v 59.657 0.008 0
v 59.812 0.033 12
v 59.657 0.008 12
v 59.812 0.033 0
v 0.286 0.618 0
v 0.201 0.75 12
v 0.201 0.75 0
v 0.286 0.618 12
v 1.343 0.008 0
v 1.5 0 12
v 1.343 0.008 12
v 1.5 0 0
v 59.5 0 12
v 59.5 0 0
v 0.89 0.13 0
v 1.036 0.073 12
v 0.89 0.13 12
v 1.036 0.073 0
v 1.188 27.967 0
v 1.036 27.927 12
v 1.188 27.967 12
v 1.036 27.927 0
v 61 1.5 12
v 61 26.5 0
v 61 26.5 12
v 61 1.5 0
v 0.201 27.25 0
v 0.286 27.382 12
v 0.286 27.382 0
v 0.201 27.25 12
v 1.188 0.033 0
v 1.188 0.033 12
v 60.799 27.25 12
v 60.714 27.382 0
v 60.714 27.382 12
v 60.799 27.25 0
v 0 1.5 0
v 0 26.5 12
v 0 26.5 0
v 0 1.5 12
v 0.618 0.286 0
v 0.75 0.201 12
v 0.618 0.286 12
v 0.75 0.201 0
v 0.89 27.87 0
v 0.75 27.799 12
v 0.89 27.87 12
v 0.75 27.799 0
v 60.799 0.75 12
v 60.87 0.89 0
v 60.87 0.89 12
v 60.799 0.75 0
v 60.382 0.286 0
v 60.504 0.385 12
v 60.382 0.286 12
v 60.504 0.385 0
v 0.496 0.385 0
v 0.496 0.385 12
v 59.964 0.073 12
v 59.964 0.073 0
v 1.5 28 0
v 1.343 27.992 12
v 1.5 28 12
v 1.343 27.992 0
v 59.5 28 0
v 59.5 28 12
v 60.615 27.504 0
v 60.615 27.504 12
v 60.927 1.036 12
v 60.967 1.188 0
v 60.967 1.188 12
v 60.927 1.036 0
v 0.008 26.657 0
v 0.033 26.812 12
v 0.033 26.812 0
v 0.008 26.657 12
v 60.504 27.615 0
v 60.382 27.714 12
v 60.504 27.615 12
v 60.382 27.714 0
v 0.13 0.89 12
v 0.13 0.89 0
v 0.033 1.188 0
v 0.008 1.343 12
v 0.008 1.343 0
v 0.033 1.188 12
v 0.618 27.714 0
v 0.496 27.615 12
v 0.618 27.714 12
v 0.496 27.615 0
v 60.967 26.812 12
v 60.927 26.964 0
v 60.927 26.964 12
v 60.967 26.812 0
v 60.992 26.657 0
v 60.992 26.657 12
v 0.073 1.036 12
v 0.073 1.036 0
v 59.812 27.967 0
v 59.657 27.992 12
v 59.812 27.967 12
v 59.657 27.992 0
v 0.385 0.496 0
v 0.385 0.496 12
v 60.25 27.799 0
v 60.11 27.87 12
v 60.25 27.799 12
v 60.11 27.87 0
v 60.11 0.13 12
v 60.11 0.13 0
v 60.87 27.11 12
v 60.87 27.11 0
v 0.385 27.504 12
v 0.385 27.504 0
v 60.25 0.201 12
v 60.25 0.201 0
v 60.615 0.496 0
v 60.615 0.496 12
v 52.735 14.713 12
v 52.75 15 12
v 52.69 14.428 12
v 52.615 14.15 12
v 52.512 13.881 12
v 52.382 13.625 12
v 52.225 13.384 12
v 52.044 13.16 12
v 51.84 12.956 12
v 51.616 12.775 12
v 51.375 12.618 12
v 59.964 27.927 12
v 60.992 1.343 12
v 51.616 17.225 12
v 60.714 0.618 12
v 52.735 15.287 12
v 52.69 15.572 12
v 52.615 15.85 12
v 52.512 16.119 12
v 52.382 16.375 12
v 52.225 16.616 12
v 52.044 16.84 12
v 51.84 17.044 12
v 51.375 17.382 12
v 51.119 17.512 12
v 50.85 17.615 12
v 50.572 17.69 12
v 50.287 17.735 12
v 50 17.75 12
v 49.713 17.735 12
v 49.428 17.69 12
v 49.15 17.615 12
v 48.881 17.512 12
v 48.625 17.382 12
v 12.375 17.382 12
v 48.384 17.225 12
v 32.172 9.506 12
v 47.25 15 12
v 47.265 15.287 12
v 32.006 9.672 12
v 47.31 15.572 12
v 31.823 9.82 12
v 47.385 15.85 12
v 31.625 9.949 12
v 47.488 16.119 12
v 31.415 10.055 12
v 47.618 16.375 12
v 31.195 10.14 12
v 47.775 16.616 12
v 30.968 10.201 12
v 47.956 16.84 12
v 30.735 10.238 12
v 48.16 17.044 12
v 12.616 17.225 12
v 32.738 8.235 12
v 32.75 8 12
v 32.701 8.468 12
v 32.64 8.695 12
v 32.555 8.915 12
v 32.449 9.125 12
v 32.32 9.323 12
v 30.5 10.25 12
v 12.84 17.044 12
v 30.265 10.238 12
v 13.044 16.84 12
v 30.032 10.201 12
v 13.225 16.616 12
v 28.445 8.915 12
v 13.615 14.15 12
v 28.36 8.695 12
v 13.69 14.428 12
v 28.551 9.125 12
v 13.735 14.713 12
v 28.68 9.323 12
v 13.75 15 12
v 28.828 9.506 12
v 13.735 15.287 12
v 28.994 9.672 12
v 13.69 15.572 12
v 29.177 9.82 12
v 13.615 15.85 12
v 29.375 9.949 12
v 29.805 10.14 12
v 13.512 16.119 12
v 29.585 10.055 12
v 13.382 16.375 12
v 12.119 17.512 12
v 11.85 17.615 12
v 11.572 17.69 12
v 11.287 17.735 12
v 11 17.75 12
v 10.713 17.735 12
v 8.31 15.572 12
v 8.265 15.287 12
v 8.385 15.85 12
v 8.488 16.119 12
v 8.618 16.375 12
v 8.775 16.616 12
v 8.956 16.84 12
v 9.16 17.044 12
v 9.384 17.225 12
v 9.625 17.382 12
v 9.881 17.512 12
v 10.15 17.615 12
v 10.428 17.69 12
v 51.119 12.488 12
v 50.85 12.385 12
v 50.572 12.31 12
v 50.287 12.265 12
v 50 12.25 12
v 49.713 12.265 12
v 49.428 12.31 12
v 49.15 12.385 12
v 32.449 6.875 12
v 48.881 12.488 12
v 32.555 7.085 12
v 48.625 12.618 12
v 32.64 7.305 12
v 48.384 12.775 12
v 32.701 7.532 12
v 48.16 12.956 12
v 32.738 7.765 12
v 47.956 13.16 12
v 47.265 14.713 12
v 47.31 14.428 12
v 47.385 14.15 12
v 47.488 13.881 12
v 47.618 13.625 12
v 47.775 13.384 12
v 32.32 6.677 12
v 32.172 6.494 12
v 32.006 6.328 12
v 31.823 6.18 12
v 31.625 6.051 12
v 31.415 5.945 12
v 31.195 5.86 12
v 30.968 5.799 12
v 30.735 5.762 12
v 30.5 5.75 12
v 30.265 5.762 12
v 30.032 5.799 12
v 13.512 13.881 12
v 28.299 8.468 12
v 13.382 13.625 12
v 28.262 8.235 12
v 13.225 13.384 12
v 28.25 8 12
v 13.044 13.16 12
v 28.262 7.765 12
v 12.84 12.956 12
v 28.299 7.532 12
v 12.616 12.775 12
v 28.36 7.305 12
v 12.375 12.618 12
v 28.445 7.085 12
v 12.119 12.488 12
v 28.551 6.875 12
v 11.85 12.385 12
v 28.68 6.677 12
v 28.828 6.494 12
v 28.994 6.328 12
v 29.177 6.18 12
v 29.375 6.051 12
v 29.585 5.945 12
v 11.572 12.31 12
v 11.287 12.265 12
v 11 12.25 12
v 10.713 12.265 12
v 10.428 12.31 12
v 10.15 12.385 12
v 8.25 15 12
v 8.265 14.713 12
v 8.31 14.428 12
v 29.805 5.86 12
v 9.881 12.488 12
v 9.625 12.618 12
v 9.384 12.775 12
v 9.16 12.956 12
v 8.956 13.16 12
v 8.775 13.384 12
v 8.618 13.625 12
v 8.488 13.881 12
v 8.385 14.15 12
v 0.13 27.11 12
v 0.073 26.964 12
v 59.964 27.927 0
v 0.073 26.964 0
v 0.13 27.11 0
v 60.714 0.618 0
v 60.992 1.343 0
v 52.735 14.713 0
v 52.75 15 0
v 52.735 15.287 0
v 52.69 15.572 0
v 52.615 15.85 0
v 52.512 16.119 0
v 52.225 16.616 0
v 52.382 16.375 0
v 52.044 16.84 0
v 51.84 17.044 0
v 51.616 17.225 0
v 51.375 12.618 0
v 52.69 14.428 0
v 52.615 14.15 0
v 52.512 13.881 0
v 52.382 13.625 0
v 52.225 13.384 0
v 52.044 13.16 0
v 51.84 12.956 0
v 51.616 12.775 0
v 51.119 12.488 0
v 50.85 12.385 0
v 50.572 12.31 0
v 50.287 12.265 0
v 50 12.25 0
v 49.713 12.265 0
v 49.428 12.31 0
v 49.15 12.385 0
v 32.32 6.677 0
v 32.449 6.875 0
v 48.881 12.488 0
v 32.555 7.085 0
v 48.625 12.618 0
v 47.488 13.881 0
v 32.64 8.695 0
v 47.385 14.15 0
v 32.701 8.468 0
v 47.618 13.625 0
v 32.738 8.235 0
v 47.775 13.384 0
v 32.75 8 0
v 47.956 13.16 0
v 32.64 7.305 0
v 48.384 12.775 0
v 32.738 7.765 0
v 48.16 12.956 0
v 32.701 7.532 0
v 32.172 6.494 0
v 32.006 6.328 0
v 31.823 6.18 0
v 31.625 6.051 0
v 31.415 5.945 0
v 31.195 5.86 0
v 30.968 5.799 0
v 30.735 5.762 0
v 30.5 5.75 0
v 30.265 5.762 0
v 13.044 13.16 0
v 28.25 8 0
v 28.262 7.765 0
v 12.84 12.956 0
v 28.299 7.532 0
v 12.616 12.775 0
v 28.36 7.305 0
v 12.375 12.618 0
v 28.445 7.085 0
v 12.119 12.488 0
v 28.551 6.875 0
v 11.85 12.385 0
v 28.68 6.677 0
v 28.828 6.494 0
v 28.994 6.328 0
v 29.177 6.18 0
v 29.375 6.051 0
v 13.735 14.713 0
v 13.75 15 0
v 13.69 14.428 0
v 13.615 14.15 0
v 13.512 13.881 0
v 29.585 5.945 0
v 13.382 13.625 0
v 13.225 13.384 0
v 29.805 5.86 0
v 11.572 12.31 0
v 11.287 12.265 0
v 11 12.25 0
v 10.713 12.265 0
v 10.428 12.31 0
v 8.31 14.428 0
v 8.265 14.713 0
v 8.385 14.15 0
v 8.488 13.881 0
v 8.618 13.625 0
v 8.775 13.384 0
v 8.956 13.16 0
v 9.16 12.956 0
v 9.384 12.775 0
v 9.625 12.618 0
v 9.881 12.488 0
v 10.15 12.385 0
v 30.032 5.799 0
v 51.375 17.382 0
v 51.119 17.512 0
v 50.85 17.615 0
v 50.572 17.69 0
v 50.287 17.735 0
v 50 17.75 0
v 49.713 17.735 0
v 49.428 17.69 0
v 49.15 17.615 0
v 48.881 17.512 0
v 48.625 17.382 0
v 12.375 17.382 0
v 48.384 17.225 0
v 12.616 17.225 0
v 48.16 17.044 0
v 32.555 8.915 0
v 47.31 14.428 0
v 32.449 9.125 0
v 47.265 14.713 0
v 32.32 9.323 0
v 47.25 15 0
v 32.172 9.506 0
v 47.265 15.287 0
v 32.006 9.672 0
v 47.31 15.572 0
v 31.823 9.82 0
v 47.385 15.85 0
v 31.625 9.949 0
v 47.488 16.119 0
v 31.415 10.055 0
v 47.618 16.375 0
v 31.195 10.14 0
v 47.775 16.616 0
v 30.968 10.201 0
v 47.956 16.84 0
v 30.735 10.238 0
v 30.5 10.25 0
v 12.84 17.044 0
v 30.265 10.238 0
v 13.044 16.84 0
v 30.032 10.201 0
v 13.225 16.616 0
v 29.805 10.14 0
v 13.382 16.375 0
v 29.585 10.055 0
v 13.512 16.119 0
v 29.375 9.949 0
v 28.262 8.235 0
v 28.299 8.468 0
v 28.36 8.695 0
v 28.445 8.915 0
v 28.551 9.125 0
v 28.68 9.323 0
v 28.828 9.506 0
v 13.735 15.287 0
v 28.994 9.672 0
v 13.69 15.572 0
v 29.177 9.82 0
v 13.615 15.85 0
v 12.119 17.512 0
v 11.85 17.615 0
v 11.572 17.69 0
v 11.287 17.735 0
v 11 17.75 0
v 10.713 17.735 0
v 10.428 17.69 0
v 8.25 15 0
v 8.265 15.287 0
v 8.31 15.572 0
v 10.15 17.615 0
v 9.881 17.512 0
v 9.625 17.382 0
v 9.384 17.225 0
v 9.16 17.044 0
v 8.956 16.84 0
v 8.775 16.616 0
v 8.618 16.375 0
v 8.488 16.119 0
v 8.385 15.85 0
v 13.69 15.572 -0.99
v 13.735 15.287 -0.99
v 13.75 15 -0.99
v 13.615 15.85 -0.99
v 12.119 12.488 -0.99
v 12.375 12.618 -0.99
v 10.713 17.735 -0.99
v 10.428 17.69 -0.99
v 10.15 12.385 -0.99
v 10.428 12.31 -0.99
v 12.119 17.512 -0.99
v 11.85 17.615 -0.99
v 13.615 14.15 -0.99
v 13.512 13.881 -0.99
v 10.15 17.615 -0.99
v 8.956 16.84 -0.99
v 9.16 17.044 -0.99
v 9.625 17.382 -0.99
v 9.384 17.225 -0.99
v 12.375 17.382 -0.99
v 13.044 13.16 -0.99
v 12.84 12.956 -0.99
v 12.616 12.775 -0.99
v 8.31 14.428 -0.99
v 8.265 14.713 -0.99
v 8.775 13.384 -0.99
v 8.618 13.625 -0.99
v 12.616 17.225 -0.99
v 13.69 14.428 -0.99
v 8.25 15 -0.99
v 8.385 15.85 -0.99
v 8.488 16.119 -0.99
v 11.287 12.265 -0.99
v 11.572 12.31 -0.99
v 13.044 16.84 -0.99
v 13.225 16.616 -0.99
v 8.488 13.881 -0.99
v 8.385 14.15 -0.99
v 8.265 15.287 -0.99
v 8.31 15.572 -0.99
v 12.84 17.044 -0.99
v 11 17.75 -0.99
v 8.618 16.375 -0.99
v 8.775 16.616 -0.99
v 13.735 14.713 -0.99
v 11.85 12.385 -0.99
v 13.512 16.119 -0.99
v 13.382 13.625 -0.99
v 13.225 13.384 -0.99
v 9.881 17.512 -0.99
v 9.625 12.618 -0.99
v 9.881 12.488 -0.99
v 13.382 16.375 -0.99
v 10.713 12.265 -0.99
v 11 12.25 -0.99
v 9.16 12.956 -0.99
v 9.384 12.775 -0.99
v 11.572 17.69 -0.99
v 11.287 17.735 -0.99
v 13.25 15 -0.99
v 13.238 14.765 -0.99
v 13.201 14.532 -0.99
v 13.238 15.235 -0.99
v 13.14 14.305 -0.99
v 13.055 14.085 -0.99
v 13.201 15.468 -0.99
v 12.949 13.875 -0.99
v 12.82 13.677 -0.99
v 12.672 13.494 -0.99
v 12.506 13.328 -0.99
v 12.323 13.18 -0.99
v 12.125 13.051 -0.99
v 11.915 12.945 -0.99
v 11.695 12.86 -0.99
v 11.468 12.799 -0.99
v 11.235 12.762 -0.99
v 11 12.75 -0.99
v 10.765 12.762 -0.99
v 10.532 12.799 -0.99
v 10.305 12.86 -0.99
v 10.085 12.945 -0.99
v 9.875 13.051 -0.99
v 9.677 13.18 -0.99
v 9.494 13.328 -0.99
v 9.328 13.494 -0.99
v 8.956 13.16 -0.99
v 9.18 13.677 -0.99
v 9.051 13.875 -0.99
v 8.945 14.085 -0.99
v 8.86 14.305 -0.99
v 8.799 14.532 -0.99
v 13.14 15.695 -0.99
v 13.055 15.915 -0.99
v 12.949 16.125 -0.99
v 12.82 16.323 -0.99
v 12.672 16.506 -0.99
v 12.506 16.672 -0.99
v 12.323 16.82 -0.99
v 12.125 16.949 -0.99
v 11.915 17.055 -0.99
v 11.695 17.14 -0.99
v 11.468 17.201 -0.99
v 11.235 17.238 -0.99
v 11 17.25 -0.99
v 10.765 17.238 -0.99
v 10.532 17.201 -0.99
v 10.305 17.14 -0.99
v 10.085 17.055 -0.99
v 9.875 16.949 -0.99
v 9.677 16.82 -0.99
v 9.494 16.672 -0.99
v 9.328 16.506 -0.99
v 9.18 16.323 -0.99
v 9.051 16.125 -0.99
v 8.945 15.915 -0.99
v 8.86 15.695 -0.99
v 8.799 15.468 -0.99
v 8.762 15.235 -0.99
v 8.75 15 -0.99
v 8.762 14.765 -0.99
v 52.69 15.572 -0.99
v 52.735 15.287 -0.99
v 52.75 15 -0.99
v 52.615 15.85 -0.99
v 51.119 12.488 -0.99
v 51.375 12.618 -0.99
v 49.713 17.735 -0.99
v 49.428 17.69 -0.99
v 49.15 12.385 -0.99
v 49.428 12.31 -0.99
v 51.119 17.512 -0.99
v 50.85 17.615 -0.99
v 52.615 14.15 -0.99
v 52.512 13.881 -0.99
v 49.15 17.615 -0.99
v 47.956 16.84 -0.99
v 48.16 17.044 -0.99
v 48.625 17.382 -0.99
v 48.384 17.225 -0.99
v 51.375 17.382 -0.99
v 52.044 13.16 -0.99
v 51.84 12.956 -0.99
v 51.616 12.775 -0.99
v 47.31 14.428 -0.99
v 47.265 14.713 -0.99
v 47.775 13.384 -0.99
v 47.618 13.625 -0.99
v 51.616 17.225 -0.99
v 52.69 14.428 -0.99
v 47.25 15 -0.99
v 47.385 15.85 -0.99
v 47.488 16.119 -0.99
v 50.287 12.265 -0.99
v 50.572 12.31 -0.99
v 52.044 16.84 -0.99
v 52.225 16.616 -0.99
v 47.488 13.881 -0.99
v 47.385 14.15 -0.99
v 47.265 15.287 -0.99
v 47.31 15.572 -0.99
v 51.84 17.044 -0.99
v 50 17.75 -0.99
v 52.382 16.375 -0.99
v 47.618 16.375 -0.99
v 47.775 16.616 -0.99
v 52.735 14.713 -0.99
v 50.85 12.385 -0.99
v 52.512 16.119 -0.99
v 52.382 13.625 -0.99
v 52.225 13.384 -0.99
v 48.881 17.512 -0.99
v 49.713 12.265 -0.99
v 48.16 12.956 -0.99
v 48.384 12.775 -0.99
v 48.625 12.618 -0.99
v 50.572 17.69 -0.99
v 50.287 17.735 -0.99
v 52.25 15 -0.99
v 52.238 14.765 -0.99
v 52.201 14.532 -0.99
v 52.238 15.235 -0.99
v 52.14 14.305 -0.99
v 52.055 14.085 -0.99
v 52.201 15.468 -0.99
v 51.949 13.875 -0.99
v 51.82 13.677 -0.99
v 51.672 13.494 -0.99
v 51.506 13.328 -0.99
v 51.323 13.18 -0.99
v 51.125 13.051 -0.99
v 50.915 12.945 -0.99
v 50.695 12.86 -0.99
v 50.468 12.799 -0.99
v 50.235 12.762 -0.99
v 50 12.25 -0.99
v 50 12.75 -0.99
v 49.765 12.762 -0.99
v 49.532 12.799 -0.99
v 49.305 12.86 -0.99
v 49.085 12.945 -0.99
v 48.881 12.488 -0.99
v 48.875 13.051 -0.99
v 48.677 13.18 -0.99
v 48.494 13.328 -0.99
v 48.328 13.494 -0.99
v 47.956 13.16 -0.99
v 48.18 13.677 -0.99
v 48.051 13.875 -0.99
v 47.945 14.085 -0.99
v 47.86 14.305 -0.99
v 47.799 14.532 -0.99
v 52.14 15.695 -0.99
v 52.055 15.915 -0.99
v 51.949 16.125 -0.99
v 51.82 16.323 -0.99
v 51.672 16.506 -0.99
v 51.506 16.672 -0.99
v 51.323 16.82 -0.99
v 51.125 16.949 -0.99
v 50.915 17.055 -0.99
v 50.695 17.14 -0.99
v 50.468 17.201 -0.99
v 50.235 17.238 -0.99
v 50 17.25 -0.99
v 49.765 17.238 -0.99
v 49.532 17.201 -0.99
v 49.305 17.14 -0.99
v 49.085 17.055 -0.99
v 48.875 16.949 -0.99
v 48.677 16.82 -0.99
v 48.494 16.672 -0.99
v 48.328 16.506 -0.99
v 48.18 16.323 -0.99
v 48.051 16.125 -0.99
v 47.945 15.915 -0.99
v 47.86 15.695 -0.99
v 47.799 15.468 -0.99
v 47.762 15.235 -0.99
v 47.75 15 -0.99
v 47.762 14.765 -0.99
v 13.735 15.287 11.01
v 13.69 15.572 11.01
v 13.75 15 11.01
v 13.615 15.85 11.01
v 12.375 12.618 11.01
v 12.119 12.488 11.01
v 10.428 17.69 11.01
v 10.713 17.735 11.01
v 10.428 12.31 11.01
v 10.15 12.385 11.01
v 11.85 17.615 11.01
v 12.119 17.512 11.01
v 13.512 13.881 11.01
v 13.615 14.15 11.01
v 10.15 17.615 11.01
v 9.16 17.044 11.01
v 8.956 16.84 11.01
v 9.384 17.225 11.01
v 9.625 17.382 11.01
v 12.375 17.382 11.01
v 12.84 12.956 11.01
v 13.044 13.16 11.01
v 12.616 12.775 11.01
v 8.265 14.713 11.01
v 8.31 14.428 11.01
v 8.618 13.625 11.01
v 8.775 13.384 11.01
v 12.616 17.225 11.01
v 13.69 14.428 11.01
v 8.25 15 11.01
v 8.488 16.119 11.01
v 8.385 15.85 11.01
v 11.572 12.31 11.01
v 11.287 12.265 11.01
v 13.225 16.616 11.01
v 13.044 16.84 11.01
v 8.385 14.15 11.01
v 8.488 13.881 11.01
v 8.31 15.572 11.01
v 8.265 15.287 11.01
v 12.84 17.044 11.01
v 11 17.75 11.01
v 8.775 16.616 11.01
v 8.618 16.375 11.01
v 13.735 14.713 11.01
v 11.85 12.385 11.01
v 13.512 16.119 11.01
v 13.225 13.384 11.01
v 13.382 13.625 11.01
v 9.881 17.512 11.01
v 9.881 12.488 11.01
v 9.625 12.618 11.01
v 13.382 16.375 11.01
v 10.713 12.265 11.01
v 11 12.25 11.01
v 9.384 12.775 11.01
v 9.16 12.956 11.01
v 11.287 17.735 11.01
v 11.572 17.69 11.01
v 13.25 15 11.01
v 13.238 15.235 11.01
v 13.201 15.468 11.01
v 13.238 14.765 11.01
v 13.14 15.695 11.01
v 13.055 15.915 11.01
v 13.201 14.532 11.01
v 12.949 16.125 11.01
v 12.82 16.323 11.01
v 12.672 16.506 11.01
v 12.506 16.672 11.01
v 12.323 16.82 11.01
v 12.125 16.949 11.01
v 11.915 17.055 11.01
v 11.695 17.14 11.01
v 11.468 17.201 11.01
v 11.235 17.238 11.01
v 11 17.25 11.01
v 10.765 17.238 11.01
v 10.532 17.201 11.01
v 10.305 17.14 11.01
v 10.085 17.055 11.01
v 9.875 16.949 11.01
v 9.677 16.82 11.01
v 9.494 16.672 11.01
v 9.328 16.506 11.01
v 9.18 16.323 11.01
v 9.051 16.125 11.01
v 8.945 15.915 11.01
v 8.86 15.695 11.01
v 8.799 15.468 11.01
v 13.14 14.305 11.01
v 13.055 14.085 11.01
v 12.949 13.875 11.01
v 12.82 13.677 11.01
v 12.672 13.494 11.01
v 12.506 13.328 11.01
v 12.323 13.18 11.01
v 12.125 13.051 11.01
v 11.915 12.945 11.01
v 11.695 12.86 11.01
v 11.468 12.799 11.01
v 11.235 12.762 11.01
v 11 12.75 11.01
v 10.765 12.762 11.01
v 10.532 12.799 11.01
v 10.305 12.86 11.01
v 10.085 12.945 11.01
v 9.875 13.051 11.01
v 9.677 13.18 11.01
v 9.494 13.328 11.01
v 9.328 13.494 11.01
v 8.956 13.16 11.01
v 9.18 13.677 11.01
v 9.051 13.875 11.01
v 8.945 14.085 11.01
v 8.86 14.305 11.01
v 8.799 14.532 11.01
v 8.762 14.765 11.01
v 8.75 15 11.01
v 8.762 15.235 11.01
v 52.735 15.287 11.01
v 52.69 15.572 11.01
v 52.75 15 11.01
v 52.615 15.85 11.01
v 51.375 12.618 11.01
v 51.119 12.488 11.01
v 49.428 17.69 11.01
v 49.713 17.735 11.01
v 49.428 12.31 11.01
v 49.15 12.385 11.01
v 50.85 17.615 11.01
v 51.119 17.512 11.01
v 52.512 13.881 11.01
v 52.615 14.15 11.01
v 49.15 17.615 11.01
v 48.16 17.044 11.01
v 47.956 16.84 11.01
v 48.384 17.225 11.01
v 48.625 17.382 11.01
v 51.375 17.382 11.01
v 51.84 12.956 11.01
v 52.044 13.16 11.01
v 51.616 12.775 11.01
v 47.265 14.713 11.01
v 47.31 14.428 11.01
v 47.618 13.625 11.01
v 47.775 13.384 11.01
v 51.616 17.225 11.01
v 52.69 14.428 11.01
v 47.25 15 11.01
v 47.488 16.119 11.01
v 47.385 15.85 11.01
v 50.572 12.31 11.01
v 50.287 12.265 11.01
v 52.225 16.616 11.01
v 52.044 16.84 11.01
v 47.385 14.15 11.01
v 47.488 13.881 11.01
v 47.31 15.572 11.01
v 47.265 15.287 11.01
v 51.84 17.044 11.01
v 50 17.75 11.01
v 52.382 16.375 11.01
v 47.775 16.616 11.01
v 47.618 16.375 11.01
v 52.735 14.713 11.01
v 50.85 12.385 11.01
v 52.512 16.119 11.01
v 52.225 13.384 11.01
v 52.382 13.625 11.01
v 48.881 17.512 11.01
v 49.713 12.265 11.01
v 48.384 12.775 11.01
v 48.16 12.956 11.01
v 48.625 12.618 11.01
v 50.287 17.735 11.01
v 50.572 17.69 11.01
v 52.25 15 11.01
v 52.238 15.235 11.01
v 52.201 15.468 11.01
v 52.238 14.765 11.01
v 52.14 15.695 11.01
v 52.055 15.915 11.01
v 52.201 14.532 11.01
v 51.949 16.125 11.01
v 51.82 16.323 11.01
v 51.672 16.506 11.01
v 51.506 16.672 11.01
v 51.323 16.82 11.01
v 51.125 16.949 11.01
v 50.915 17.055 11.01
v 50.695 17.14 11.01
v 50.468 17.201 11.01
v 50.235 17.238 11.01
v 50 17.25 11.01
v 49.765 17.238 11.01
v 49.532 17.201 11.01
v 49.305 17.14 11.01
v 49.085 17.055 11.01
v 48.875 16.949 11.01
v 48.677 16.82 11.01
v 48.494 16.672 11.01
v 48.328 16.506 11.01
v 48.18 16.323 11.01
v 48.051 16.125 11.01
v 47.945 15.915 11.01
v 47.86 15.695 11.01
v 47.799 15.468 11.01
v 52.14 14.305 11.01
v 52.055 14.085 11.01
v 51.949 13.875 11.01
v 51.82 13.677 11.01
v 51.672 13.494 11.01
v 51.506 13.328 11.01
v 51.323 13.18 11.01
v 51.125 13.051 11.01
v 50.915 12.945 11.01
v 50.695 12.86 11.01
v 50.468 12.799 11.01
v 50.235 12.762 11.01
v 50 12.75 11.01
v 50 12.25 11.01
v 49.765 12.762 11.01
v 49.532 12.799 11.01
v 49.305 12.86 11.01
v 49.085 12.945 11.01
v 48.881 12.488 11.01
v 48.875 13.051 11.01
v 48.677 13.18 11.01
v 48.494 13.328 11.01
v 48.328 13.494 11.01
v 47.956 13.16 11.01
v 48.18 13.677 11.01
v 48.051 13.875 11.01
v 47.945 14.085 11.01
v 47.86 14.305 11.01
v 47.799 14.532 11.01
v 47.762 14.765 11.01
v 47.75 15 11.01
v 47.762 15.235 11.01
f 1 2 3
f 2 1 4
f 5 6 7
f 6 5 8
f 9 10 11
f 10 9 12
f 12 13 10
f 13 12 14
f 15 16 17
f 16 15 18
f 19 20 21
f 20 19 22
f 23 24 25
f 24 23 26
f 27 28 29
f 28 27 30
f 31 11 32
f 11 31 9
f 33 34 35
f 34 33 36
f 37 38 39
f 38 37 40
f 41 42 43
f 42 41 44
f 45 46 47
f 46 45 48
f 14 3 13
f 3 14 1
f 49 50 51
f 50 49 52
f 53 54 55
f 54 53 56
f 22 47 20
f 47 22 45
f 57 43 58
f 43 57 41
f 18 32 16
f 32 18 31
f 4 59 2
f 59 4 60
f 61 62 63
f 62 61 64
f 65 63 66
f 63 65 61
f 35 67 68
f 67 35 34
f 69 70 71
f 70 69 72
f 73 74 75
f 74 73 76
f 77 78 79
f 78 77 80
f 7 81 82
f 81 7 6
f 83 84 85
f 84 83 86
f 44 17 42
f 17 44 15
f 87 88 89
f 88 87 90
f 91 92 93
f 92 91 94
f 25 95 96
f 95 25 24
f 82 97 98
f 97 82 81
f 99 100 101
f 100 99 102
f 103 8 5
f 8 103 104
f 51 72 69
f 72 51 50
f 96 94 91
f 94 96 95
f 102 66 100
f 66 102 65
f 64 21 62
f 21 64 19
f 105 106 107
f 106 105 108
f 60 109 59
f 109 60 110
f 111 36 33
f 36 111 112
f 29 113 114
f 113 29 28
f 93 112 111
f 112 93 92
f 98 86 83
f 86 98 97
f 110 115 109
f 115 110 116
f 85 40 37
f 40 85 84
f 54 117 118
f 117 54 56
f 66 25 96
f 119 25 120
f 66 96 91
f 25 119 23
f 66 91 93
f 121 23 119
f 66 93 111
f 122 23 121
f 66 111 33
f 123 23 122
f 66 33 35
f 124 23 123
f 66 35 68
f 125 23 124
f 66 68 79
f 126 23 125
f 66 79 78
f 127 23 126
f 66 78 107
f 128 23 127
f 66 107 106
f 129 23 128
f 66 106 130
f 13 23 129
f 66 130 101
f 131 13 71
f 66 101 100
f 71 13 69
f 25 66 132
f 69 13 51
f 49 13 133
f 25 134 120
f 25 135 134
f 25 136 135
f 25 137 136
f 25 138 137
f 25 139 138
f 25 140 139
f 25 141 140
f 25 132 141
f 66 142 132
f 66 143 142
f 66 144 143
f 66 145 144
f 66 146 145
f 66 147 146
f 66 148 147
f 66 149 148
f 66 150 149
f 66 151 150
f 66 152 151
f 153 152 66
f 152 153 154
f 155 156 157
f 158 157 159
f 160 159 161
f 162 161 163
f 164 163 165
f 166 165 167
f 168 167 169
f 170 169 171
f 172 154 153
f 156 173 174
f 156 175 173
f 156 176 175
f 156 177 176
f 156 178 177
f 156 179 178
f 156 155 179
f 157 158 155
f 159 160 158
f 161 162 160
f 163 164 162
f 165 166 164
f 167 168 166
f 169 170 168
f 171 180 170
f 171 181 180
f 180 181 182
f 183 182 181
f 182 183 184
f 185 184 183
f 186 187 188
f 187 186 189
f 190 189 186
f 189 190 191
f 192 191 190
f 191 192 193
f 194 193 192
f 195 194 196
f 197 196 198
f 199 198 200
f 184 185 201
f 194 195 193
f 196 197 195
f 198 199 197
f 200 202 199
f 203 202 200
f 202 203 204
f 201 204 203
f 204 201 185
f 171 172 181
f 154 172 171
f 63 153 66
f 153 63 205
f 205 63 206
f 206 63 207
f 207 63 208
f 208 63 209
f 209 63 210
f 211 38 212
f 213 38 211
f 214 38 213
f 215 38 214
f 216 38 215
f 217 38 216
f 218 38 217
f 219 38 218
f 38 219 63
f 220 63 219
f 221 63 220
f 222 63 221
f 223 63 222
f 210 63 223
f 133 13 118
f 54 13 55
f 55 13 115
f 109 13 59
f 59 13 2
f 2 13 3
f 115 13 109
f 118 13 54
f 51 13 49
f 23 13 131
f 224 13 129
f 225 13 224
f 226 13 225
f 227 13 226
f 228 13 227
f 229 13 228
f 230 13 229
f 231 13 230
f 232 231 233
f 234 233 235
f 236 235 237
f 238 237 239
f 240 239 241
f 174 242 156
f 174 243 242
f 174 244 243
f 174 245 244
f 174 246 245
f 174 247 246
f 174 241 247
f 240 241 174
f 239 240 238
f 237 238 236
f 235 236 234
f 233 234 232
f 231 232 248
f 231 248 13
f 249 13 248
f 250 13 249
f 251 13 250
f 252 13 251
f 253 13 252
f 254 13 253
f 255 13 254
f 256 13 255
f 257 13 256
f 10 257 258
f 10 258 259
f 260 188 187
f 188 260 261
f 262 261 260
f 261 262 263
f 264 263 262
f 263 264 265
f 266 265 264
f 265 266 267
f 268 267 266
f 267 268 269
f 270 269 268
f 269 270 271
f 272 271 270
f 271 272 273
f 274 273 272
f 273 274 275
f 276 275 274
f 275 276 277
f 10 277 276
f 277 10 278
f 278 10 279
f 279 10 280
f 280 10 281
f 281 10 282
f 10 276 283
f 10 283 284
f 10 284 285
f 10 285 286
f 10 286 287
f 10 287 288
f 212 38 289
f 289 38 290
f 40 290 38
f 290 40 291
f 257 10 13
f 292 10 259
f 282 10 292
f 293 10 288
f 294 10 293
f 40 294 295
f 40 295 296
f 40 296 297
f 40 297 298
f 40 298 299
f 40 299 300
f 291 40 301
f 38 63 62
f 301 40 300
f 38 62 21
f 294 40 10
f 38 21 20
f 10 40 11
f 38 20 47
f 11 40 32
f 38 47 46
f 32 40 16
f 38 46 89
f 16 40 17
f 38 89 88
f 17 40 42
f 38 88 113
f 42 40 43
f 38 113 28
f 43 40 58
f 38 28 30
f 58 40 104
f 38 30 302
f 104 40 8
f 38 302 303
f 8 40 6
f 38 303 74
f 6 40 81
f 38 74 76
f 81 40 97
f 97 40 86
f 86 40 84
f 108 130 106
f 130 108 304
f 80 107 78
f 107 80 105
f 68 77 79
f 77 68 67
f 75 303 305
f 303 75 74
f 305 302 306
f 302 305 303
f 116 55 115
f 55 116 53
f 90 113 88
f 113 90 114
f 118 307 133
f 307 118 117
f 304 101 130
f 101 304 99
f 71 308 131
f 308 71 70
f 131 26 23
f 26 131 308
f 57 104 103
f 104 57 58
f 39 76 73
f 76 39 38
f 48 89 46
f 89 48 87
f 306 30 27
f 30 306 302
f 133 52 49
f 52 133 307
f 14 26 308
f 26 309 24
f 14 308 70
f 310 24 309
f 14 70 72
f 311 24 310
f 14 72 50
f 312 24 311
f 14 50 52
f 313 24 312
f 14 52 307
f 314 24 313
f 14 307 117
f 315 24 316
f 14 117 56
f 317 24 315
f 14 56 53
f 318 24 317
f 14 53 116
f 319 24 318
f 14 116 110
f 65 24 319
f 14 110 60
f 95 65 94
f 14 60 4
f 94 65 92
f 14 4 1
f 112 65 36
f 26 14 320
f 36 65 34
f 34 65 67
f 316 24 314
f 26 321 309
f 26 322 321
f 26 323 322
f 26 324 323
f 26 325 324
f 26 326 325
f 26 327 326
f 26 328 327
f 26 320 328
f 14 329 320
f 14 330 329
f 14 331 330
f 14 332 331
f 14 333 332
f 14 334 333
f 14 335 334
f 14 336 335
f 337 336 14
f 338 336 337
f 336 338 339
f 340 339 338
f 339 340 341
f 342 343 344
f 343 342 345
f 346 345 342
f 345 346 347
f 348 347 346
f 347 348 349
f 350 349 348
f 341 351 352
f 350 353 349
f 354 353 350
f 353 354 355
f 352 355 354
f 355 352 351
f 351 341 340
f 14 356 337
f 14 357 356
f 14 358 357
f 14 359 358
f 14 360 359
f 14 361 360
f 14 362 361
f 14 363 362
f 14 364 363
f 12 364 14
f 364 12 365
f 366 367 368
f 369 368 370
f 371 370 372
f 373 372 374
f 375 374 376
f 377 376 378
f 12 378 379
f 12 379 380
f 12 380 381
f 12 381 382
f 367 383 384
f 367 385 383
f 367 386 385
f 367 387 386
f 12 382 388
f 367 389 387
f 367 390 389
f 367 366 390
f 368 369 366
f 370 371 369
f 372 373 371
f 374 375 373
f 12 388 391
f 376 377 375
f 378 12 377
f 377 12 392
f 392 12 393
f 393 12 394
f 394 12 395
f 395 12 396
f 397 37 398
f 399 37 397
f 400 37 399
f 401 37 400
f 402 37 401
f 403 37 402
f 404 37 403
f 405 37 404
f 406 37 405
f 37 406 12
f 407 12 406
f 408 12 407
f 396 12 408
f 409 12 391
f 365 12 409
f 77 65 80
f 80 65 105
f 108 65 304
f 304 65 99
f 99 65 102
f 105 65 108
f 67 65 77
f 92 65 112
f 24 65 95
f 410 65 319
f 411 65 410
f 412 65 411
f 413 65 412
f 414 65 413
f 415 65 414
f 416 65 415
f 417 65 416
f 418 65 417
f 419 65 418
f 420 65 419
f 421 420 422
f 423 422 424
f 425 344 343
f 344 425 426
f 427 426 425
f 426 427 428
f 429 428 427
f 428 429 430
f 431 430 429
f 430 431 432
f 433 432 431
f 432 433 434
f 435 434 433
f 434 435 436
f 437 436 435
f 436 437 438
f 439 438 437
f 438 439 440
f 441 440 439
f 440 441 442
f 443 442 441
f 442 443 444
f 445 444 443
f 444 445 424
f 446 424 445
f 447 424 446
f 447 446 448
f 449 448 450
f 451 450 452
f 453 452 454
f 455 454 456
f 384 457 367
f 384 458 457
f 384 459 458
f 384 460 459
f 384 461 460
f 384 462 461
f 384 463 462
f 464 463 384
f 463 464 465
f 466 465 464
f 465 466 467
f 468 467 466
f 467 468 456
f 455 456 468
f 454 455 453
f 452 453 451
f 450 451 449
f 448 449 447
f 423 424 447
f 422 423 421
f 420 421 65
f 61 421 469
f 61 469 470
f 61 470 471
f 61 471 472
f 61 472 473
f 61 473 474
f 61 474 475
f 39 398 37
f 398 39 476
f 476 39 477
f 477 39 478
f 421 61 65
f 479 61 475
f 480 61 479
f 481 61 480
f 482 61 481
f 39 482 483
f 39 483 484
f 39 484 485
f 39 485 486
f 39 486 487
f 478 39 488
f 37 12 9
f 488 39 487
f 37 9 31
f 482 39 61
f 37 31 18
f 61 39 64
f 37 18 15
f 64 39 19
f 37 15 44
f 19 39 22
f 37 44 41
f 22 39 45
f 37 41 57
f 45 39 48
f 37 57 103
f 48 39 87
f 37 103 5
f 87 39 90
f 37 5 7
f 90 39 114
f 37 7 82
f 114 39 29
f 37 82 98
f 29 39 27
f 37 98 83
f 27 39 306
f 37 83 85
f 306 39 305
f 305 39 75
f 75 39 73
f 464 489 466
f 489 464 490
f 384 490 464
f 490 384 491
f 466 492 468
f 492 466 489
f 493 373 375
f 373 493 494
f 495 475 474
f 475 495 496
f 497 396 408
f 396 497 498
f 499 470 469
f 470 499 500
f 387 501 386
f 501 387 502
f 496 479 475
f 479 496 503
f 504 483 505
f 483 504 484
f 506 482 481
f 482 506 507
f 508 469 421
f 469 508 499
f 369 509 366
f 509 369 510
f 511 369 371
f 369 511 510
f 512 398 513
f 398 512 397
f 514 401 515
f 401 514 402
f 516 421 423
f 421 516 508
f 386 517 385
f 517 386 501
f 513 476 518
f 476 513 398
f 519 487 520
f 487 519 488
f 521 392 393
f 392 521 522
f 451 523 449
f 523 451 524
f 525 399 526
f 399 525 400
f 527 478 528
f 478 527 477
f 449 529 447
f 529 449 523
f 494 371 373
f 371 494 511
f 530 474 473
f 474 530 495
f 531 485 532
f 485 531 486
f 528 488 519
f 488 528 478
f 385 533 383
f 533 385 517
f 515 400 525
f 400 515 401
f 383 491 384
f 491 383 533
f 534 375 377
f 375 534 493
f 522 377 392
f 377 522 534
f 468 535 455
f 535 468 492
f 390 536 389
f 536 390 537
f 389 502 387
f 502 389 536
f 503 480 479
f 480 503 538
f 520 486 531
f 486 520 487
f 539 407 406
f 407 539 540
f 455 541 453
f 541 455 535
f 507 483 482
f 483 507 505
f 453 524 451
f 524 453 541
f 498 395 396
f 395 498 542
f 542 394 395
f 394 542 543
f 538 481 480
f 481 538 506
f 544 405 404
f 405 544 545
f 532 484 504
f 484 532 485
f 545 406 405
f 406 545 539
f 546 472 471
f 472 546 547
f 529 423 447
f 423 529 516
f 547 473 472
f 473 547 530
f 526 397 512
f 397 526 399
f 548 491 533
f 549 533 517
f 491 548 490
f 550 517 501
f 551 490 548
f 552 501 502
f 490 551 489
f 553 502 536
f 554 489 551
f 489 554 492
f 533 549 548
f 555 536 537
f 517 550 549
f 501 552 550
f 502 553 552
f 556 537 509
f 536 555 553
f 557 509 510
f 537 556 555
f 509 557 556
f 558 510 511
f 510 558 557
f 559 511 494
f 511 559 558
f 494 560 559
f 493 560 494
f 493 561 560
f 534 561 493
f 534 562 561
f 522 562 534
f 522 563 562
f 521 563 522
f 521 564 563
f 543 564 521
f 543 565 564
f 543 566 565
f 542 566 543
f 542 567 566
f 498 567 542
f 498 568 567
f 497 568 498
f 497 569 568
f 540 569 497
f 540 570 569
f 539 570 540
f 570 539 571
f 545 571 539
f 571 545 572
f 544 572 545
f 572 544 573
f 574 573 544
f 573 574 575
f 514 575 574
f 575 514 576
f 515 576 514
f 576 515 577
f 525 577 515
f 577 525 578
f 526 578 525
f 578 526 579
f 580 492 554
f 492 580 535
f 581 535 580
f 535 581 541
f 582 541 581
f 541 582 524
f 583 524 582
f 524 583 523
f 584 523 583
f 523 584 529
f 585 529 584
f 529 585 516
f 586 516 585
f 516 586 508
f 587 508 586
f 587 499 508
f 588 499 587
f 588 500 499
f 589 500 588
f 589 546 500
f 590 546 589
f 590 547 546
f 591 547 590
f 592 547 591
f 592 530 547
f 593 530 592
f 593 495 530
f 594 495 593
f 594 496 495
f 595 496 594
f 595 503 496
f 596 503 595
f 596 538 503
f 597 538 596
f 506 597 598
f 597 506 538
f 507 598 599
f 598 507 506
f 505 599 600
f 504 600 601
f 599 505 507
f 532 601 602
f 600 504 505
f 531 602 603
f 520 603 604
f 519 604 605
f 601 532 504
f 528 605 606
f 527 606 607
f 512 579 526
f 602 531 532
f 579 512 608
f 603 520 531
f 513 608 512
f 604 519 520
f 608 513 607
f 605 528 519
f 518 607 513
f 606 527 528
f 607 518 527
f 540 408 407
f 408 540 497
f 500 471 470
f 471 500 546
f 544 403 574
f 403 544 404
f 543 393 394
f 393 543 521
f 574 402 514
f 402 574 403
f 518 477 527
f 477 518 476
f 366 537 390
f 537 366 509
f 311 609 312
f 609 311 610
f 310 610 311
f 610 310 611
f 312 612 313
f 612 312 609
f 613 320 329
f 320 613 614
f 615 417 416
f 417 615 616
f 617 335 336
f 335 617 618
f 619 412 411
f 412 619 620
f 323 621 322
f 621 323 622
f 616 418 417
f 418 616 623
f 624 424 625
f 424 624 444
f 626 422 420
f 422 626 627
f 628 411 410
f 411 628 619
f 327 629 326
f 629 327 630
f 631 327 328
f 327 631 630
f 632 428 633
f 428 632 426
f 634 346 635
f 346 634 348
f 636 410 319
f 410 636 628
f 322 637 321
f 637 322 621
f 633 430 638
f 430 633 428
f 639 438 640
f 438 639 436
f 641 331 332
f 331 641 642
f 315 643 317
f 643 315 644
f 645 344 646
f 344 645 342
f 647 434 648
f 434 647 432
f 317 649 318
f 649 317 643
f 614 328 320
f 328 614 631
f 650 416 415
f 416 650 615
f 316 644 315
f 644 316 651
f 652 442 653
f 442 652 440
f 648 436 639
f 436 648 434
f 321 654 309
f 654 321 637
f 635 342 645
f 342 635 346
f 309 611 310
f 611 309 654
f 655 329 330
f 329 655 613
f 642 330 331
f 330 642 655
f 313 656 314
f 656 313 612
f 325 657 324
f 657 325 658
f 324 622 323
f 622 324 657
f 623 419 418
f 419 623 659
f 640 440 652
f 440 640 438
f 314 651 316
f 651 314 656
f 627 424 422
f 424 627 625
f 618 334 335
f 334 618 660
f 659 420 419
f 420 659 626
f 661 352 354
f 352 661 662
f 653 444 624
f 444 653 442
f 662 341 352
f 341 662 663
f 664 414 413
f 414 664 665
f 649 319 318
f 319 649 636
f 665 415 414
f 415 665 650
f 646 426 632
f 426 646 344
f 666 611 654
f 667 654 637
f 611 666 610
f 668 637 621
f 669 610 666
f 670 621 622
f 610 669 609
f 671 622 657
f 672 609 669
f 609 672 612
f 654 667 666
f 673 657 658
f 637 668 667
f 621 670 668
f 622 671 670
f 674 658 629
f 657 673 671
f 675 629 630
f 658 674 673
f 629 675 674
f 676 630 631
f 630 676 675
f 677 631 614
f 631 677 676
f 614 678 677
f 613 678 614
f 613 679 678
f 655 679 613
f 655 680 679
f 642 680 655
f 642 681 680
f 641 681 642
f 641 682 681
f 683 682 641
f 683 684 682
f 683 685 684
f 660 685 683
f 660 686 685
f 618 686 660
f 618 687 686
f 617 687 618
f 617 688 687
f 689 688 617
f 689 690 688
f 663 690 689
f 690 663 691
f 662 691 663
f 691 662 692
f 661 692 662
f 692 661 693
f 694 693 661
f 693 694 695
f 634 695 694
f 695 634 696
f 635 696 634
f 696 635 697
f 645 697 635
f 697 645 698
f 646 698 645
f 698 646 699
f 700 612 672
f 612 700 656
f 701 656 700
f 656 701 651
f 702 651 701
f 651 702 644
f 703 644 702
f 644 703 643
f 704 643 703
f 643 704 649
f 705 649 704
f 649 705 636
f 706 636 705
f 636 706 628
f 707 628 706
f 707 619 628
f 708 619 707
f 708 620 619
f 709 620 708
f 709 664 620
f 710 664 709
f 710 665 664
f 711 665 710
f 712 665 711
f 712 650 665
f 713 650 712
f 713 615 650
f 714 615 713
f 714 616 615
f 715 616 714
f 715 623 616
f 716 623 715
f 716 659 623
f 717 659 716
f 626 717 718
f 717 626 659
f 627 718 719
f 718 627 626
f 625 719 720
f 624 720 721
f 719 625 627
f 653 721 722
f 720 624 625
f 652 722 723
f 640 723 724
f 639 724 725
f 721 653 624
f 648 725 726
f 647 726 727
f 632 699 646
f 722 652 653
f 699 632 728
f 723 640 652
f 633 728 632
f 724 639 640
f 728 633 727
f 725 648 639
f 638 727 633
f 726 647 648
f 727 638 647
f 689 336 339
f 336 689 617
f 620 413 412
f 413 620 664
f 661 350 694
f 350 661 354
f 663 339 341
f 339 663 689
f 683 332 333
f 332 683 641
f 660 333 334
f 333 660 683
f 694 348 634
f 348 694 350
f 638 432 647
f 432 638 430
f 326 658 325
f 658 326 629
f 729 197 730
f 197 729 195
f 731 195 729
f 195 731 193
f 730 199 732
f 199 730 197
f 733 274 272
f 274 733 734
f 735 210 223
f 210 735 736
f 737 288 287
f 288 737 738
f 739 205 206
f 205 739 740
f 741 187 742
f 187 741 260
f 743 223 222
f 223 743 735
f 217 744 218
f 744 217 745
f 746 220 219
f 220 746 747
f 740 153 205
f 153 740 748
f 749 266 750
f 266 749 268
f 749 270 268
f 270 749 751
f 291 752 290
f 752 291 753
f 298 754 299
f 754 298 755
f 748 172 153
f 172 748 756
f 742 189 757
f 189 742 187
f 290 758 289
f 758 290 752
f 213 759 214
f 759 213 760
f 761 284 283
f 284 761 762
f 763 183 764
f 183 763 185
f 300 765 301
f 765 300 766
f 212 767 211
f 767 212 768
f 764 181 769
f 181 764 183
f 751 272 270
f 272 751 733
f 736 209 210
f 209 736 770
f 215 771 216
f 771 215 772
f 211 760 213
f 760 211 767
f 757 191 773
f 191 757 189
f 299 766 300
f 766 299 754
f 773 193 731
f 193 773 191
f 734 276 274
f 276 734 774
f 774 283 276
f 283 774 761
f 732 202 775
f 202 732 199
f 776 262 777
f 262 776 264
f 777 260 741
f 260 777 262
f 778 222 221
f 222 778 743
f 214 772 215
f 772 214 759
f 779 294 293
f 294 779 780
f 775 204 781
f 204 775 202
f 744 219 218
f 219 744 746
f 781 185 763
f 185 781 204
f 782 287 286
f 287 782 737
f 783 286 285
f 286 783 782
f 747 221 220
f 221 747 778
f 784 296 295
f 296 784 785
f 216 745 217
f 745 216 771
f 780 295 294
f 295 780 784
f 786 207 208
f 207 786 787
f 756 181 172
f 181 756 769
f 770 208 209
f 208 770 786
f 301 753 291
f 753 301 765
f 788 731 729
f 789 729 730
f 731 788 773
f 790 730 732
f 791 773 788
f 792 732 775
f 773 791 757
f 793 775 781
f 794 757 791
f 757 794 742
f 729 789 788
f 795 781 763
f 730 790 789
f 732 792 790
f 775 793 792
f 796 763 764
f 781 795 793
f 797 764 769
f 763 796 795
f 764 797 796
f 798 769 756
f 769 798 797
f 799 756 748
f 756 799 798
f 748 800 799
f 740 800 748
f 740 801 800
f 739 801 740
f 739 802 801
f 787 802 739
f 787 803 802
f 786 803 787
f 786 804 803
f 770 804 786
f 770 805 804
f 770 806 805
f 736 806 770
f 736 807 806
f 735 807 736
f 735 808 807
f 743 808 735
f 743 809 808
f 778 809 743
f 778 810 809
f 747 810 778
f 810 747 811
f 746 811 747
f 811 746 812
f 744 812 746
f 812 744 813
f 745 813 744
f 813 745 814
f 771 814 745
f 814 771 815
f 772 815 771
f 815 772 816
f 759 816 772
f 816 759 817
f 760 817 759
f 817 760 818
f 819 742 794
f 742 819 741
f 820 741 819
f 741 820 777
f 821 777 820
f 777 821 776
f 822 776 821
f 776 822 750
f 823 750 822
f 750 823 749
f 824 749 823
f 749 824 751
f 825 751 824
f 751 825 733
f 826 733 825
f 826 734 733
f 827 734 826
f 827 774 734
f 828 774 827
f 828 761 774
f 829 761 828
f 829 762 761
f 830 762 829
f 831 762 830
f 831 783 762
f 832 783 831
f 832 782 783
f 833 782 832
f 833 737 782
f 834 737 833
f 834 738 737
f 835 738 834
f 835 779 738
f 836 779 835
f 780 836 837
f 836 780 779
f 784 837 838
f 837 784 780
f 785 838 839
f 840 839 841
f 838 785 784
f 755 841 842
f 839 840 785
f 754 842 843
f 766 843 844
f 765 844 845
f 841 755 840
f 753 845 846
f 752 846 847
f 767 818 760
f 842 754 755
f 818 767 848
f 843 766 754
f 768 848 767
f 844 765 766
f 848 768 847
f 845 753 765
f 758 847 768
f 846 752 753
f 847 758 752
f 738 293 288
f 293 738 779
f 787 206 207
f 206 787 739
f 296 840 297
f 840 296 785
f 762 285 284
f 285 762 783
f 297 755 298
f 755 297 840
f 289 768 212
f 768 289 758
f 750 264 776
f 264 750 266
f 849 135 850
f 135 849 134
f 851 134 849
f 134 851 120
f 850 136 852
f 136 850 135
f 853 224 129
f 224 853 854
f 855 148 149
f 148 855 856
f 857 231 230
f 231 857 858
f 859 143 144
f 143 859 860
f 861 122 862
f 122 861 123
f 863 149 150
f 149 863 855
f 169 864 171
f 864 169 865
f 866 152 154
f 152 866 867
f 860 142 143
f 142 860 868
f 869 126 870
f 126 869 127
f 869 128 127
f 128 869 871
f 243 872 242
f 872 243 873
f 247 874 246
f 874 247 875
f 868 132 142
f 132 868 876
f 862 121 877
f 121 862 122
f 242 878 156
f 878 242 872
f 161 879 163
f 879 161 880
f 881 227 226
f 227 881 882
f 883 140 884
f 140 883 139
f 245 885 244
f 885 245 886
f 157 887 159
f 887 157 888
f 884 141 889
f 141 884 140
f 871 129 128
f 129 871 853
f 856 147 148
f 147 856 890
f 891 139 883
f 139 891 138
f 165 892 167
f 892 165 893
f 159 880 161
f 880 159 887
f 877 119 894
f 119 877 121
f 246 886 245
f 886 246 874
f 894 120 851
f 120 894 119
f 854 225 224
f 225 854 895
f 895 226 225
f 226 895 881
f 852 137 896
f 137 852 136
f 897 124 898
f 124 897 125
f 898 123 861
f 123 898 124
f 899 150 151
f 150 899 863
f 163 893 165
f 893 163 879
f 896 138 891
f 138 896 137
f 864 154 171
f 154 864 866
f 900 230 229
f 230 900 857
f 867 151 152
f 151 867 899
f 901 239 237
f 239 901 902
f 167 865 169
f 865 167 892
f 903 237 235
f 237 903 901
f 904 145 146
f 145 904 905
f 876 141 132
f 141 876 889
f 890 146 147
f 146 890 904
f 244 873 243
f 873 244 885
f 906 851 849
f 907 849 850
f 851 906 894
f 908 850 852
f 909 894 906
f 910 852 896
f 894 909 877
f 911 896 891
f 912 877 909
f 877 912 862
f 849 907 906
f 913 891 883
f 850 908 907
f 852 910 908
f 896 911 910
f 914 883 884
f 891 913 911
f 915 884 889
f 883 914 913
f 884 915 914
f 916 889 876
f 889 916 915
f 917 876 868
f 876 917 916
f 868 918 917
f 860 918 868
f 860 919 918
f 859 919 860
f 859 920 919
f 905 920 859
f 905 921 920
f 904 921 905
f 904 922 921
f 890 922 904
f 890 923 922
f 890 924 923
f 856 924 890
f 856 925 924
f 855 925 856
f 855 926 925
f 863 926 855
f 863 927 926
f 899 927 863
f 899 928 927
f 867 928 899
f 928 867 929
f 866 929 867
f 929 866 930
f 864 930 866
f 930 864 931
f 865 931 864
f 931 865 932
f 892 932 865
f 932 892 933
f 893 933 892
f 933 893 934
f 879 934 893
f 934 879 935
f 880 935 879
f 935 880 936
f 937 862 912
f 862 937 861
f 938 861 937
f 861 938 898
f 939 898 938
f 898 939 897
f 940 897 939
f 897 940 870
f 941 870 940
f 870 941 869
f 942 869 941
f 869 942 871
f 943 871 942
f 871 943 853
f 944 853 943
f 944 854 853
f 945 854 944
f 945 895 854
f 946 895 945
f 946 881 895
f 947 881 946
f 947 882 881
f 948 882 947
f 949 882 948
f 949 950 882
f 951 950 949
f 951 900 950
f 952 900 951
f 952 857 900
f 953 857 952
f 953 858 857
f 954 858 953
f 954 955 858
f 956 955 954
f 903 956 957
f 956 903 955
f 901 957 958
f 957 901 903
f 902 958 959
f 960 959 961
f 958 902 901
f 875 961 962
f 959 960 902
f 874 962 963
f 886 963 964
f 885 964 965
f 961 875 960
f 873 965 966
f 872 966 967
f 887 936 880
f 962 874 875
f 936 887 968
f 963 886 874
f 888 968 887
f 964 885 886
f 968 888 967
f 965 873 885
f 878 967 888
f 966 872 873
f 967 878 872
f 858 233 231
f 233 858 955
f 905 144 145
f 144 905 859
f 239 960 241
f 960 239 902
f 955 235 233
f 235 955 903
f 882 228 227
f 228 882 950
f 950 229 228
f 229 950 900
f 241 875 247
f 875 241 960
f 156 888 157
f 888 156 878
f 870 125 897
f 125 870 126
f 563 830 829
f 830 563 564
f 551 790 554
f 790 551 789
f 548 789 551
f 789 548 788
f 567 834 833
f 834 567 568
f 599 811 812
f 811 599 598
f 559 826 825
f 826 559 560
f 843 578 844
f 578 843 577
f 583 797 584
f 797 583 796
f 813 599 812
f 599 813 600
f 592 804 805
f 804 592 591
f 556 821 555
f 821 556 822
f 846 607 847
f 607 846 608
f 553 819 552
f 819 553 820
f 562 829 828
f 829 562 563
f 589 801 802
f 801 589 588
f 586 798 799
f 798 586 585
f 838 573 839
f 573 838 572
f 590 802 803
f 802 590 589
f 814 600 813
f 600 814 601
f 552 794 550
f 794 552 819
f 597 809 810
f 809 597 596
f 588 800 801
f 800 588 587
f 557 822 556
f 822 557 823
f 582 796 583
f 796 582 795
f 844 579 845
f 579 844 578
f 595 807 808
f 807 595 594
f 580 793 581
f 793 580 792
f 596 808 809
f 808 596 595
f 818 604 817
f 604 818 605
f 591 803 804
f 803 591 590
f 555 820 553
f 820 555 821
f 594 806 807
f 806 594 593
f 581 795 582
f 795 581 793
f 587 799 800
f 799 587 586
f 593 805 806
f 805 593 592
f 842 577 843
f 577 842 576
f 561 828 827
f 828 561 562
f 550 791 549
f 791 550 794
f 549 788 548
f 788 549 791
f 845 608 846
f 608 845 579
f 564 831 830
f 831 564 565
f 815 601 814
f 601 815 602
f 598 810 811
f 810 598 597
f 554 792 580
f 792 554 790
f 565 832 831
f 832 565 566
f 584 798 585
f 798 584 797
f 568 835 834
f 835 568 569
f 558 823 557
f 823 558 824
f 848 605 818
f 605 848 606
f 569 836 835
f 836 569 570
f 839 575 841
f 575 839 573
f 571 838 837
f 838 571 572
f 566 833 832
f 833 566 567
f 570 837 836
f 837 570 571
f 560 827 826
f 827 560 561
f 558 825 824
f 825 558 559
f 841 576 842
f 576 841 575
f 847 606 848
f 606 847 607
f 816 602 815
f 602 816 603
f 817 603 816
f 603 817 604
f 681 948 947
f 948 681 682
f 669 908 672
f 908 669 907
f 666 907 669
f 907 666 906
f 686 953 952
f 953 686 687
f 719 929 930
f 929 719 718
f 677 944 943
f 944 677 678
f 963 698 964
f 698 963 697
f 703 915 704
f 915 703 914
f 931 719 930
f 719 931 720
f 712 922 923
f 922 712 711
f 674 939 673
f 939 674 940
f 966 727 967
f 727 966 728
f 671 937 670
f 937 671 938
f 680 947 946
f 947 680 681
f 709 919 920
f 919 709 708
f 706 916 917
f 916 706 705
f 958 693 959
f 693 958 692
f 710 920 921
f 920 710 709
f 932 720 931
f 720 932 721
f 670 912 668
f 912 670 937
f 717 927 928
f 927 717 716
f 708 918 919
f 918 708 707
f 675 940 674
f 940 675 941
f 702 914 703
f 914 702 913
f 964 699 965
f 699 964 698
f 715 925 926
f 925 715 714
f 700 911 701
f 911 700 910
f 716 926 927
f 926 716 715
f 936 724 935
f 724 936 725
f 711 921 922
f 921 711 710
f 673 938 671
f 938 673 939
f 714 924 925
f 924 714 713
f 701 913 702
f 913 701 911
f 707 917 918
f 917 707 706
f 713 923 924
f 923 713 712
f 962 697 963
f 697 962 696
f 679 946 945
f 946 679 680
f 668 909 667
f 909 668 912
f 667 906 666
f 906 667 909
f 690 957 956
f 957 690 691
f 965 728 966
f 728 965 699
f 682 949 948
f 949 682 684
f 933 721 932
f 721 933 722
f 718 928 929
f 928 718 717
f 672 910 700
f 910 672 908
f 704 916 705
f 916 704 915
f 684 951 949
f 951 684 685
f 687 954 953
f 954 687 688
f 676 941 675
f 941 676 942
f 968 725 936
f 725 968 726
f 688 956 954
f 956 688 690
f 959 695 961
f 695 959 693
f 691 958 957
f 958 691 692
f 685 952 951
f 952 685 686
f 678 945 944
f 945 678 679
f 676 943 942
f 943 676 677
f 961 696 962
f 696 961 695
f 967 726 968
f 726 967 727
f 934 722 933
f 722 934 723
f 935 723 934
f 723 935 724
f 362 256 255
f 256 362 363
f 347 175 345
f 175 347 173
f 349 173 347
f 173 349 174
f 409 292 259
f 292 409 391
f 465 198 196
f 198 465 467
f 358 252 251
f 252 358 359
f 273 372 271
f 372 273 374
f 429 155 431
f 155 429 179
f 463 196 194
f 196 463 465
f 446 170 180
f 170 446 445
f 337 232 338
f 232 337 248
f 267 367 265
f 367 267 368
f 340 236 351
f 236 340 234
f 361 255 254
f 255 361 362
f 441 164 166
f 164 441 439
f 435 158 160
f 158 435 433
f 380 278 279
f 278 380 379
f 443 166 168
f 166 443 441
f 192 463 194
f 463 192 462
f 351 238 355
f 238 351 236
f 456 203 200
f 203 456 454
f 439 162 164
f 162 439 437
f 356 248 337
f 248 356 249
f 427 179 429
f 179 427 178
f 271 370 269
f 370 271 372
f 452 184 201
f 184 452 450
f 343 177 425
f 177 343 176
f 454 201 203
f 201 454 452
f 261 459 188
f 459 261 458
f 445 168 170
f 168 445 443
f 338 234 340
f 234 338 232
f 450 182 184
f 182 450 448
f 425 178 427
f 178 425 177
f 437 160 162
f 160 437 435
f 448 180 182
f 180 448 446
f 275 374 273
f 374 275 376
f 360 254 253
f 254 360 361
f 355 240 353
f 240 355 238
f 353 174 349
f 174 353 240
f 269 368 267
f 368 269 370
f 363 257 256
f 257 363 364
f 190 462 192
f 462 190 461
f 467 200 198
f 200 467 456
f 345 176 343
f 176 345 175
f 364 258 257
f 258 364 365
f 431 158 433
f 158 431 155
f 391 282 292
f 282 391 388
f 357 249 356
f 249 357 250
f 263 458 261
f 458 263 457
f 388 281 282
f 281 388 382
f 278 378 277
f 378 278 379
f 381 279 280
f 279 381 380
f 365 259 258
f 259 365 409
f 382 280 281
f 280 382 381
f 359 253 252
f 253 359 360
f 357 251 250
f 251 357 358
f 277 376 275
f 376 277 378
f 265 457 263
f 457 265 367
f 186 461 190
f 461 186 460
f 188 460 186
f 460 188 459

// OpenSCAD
// door lock pad

$fn = 60;

x = 61.0;   // plate dimension in X (width)
y = 28.0;   // plate dimension in 4 (height)
z = 12.0;   // plate dimension in Z (thickness) -- door to outside
r =  1.5;   // radius of corners

hx = 11.0;  // hole X
hy = 15.0;  // hole Y
hd =  4.5;  // hole diameter
hh = 80.0;  // hole "height"

chx = x/2.0;// center hole X
chy =  8.0; // center hole X
chd =   hd; // center hole diameter
chh =   hh; // center hole "height"

csd = 5.5;  // counter-sunk diameter
csh = 1.0;  // counter-sunk height

module roundedBox0(
  size = [1, 1, 1],
  radius = 0.1,
  sidesOnly = false
) {
  hull() {
    for(z = [-size[2]/2, size[2]/2]) {
      for(y = [-size[1]/2, size[1]/2]) {
        for(x = [-size[0]/2, size[0]/2]) {
          translate([
            x - radius*sign(x),
            y - radius*sign(y),
            z - radius*sign(z)
          ])
          if(sidesOnly) {
            cylinder(
              r = radius,
              h = 2*radius,
              center=true
            );
          } else {
            sphere(
              r = radius,
              center=true
            );
          }
        }
      }
    }
  }
}

module roundedBox(
  size = [1, 1, 1],
  radius = 0.1,
  sidesOnly = false,
  topOnly = false
) {
  if(false==topOnly) {
    roundedBox0(
      size = size,
      radius = radius,
      sidesOnly = sidesOnly
    );
  } else {
    translate([0, 0, -size[2]/2])
    difference() {
      roundedBox0(
        size = [
          size[0],
          size[1],
          2*size[2]
        ],
        radius = radius,
        sidesOnly = sidesOnly
      );
      scale([4*size[0], 4*size[1], 4*size[2]])
      translate([-0.5, -0.5, -1])
      cube();
    }
  }
}


// base rounded box shape
module box() {
  translate([x/2.0, y/2.0, z/2.0])
  roundedBox(
    size = [x, y, z],
    radius = r,
    sidesOnly = true,
    topOnly = true
  );
}

// hole with a scaling factor
module hole(
    s = 1.0
) {
  translate([hx, hy, 0])
  scale([s, s, 1.0])
  cylinder(
    d = hd,
    h = hh,
    center = true
  );
}

// simple hole in the center
module centerHole() {
  translate([chx, chy,0])
  cylinder(
    d = chd,
    h = chh,
    center = true
  );
}

// side holes
module holes(
    s = 1.0
) {
                             hole(s = s);
  translate([x-hx-hx, 0, 0]) hole(s = s);
}

// counter-sunk around side holes
module counterSunkHole() {
  translate([0, 0, csh/2.0])
  scale([1, 1, csh/hh])
  holes(s = (csd/hd));
}

module boredBox() {
  difference() {
    union() {
      box();
      translate([0, 0, -csh + 1/100]) counterSunkHole();
    }
    translate([0, 0, z-csh + 1/100]) counterSunkHole();
    centerHole();
    holes();
  }
}

boredBox();
